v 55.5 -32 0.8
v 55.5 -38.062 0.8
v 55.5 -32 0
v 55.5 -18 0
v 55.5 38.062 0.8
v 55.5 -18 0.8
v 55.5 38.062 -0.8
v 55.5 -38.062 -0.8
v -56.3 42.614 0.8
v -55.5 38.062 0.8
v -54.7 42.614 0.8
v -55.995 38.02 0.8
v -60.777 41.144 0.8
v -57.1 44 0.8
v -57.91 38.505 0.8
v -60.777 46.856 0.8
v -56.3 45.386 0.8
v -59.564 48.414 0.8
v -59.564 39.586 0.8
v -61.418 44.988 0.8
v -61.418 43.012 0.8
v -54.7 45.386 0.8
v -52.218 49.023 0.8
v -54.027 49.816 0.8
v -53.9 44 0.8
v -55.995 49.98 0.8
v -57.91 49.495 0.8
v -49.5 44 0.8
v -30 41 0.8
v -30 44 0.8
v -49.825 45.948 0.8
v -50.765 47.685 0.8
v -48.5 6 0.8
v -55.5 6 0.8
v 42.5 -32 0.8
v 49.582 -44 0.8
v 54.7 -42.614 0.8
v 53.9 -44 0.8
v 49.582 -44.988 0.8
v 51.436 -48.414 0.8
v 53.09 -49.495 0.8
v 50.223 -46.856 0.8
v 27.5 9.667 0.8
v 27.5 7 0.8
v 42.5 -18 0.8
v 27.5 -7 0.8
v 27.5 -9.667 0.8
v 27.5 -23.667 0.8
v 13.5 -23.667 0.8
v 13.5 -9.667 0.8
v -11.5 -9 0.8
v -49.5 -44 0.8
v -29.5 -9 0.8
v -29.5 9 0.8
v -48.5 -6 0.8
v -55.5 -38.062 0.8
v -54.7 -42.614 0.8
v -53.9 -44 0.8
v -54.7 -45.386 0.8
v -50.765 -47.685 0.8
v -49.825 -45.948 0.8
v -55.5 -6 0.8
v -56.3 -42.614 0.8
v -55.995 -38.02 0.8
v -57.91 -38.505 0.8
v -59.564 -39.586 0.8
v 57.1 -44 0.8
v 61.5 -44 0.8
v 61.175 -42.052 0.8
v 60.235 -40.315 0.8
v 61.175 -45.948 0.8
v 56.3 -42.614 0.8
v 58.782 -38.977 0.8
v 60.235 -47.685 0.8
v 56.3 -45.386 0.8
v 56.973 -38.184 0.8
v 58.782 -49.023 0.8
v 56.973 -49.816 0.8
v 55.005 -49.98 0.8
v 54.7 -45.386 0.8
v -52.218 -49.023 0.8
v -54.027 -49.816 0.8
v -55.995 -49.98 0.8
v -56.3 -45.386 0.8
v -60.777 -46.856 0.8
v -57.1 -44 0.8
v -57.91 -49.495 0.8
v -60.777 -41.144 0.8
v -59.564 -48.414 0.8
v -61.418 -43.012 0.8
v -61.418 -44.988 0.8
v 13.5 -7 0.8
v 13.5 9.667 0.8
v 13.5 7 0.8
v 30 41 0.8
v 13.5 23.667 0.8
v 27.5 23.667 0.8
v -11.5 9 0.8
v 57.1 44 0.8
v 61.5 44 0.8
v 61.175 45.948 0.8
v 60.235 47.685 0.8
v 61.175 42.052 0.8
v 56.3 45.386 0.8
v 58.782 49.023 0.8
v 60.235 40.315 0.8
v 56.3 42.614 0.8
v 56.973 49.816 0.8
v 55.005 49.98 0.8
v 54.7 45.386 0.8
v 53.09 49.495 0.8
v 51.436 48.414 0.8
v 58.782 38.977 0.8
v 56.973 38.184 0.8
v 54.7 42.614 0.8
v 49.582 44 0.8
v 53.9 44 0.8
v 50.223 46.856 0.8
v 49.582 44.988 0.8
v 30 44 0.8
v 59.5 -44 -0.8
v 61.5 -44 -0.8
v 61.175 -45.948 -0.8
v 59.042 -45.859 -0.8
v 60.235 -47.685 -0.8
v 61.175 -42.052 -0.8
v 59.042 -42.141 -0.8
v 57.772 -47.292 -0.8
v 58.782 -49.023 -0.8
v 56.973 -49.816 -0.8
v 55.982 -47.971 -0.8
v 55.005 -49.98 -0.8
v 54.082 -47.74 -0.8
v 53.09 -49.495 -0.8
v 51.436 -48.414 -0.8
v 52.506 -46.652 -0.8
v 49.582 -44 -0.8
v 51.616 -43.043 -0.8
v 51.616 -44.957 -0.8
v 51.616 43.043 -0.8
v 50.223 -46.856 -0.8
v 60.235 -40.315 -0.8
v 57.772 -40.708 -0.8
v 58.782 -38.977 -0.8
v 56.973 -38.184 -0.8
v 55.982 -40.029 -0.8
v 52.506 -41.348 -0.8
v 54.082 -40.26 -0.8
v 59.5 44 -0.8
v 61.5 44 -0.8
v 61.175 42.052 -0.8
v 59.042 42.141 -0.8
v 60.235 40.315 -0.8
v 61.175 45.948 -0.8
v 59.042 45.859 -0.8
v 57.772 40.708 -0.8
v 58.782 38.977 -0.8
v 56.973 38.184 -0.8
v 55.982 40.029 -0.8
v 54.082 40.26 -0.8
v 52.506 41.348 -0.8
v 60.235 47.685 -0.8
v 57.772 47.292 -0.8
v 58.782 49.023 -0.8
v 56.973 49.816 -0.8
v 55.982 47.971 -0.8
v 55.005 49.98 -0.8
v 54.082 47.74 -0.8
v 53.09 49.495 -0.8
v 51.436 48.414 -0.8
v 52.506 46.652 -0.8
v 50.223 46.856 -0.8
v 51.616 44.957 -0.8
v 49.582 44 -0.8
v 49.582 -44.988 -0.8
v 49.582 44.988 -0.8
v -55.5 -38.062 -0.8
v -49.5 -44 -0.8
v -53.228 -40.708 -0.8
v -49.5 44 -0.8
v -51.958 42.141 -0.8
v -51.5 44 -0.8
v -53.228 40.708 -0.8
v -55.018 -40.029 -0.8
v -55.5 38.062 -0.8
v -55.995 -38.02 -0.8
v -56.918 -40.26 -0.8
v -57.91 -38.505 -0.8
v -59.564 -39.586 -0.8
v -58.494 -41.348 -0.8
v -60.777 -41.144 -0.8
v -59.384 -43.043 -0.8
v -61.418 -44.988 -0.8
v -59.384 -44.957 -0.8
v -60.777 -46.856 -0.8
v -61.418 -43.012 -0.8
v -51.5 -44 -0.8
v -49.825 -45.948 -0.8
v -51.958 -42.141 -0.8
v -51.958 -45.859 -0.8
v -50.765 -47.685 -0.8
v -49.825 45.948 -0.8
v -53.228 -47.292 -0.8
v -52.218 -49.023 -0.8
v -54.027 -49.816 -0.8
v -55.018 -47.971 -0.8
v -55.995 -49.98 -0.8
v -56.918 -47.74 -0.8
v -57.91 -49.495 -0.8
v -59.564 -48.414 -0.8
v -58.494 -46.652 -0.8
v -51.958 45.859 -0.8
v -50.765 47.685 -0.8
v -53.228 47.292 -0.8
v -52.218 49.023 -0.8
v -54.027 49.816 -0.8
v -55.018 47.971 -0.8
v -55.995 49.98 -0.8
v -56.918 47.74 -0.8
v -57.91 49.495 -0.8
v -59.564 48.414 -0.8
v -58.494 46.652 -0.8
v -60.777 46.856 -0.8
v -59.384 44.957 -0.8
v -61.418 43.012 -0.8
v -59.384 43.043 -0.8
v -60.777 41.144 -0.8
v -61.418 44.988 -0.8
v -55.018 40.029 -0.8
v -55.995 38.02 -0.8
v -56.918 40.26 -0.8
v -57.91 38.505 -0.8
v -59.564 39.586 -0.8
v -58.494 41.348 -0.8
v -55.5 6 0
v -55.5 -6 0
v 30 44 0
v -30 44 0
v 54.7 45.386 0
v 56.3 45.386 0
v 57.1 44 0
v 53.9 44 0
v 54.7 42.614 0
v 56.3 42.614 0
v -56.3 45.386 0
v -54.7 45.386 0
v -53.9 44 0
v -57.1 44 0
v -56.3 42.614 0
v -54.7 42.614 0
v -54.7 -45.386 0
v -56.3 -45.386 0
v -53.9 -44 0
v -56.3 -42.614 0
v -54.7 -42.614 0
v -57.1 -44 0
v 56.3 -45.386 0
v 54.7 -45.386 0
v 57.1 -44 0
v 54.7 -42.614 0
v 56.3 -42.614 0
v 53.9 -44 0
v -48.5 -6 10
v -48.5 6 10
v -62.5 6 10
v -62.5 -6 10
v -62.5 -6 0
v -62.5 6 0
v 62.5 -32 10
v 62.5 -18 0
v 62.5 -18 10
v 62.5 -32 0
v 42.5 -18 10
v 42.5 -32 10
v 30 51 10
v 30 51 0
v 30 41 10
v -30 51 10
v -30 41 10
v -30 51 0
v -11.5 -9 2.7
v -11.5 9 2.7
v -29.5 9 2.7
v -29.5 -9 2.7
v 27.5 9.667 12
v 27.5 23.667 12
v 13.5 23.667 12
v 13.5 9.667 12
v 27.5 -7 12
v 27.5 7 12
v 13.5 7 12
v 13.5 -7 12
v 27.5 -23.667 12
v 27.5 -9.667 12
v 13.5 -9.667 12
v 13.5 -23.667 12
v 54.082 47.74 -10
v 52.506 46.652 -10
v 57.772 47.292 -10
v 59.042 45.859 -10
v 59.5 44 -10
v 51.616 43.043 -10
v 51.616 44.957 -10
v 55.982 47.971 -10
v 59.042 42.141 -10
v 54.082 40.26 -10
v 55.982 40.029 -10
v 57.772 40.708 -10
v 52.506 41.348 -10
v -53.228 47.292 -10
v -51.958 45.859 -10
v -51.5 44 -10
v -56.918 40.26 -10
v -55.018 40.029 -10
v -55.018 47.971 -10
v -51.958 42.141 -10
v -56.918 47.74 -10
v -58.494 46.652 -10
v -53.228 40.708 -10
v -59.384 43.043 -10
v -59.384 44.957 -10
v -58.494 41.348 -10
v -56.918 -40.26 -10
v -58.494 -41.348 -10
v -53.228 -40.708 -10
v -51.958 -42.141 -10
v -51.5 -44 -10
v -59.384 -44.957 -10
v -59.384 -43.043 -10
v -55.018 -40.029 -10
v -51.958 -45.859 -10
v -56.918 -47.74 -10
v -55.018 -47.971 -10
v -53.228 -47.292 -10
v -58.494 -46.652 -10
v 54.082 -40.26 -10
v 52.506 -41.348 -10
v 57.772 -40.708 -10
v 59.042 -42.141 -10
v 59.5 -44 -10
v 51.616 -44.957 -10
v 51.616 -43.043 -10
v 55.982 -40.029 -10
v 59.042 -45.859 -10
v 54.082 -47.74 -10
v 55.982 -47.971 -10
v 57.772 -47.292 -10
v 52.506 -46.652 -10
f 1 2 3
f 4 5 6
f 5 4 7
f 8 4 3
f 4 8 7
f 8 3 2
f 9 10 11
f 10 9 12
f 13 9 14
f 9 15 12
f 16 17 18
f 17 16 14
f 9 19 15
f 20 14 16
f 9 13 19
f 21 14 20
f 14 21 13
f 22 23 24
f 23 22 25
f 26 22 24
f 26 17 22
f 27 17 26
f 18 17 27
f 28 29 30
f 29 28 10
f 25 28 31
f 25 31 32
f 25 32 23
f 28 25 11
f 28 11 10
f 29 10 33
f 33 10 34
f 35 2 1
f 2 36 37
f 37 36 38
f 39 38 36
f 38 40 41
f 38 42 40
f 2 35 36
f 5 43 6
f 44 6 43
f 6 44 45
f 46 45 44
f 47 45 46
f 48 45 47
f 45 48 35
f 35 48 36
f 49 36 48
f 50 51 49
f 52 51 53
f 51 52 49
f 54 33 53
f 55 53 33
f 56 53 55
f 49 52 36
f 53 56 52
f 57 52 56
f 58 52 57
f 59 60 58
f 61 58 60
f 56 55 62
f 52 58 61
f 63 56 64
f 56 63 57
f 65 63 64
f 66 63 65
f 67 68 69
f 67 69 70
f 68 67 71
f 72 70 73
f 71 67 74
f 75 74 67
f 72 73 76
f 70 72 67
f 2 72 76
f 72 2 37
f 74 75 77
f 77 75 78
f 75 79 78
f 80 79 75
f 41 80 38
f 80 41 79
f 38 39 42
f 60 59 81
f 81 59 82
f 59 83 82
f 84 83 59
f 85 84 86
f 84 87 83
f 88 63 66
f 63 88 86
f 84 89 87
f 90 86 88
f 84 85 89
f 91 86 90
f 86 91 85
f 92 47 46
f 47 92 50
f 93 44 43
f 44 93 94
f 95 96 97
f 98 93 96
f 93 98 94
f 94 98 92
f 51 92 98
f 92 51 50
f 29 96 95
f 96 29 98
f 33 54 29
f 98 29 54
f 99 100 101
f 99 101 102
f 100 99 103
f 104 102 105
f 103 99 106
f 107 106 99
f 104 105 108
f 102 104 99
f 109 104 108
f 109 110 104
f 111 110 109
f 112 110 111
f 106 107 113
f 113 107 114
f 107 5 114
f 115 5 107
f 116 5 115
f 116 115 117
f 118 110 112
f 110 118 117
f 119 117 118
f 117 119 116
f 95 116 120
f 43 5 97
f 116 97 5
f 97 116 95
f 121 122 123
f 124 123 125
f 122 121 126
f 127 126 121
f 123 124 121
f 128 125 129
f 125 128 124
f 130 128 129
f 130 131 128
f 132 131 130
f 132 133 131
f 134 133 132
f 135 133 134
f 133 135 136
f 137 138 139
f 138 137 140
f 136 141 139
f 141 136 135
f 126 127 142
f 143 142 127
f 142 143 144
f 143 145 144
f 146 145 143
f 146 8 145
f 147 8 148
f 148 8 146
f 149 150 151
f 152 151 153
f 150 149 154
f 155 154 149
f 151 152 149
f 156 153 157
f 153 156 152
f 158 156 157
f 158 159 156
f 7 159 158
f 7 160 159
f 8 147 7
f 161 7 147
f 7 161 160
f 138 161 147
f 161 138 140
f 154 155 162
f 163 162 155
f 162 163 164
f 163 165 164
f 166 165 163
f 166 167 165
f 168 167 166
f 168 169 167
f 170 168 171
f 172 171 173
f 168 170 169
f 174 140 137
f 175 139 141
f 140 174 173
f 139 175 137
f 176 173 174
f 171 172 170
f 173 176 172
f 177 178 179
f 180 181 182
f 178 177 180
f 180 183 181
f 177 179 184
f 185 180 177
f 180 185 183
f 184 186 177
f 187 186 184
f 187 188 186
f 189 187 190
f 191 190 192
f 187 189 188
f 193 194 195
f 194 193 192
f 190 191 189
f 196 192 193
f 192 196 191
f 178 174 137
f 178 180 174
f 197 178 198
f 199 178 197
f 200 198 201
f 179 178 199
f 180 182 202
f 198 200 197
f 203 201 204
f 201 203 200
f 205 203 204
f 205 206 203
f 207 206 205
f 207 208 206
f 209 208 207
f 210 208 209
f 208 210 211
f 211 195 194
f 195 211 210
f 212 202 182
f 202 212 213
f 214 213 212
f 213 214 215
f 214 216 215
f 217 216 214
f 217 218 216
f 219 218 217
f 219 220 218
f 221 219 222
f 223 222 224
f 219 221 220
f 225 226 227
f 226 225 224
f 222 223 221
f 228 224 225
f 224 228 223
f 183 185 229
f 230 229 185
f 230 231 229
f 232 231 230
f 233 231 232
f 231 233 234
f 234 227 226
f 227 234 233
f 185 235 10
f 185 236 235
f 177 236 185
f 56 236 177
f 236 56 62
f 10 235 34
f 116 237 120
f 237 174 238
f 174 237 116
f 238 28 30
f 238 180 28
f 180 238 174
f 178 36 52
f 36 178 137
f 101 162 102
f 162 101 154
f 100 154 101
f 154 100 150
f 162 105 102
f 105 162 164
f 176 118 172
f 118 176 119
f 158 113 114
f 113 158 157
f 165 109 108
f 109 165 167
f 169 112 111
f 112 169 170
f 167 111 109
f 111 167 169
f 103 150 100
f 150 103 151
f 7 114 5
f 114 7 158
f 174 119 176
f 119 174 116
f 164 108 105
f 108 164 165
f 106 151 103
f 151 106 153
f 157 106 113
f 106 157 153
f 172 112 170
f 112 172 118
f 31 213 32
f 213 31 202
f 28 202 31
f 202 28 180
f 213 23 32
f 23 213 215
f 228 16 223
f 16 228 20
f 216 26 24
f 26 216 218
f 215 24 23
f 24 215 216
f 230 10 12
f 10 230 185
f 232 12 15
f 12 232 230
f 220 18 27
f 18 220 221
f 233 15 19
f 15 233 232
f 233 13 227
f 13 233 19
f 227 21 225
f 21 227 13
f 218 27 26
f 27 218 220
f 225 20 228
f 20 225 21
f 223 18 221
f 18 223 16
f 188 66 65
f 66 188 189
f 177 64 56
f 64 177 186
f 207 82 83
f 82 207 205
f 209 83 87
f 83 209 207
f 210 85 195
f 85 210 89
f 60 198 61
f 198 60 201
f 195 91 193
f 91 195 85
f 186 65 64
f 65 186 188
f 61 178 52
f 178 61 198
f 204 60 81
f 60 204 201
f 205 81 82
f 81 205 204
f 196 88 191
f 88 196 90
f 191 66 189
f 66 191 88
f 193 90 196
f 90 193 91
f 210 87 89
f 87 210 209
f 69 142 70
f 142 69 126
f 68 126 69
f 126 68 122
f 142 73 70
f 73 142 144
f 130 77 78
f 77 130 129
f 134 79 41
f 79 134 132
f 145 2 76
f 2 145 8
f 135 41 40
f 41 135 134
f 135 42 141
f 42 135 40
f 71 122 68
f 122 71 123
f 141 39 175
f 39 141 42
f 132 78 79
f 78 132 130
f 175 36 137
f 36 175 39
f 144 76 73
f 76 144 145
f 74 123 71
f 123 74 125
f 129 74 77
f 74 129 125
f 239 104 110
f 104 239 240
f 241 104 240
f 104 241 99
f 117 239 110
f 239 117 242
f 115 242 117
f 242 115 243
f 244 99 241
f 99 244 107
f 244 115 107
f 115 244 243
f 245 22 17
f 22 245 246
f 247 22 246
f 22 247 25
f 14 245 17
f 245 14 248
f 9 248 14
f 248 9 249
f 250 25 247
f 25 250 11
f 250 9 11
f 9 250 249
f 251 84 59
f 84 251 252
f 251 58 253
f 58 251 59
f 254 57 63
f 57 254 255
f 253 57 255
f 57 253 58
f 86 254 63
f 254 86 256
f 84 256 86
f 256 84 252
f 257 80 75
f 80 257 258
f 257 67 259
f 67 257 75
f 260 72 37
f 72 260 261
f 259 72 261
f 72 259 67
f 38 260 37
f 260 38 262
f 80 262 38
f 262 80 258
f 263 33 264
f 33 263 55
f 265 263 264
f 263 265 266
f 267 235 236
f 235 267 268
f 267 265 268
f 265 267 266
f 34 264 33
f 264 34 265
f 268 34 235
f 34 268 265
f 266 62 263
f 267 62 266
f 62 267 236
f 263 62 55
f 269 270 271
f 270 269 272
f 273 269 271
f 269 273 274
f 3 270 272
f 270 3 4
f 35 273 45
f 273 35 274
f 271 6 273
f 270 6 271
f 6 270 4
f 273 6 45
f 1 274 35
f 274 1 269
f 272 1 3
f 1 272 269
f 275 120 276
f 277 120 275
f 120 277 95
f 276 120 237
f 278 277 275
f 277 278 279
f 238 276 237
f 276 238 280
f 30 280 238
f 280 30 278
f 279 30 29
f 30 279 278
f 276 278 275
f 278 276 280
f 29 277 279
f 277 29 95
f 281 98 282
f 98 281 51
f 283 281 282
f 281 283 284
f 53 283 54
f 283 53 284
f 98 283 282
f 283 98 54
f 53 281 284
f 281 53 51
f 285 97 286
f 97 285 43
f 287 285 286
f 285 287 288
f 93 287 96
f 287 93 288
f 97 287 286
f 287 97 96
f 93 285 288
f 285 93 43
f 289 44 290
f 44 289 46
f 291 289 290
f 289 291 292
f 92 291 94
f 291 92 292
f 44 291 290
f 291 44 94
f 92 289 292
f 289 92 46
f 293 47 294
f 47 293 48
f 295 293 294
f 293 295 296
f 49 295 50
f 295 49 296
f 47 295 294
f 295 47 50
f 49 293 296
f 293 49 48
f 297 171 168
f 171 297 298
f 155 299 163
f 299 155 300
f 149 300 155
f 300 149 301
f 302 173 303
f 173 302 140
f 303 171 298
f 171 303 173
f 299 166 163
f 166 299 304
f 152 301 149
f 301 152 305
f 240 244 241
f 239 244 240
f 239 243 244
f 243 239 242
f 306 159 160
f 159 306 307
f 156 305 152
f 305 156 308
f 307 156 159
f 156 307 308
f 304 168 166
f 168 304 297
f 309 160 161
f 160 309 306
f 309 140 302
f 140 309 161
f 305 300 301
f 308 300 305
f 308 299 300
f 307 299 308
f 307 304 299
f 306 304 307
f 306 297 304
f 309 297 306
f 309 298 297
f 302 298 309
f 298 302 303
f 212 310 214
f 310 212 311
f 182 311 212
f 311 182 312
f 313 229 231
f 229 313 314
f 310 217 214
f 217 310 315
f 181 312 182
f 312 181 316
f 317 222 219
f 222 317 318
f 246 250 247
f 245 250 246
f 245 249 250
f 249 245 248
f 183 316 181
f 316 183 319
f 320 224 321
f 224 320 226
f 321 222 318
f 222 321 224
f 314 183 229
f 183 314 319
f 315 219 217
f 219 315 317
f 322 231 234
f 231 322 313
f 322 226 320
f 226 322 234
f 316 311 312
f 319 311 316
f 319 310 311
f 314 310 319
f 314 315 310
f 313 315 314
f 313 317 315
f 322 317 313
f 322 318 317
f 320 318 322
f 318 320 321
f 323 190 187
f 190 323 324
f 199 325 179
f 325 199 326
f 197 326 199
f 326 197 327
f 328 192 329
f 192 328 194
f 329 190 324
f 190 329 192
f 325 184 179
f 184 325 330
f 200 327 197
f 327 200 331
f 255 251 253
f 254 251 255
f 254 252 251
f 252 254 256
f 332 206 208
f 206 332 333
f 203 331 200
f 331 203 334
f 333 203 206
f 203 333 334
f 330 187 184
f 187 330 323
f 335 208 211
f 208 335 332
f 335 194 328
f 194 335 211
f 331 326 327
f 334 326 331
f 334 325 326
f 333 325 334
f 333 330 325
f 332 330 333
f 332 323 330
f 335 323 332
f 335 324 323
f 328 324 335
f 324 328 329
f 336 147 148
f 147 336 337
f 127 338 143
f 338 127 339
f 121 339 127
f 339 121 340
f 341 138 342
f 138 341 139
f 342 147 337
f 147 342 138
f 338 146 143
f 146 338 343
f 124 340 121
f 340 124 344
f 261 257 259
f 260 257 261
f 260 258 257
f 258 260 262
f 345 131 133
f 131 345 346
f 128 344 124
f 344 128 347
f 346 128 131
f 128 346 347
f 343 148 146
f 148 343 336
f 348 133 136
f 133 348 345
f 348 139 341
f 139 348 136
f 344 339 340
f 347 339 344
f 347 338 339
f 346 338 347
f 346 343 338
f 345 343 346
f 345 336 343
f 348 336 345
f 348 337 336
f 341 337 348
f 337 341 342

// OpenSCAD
// Parameters
pcb_L = 123; //[61.5:246:0.5]
pcb_W = 100; //[50:200:0.5]
pcb_T = 1.6; //[0.8:3.2:0.1]
corner_R = 6; //[2:12:0.5]
hole_d = 3.2; //[2.4:5:0.1]
hole_edge_offset = 6; //[3:12:0.5]
standoff_d = 8; //[5:16:0.5]
standoff_h = 10; //[4:25:0.5]
standoff_overlap = 0.8; //[0.5:2:0.1]
conn_h = 10; //[6:20:0.5]
conn_overlap = 0.8; //[0.5:2:0.1]
chip_h = 2.5; //[1:6:0.1]
chip_overlap = 0.6; //[0.5:2:0.1]
heatsink_h = 12; //[6:30:0.5]
heatsink_overlap = 0.8; //[0.5:2:0.1]
silk_T = 0.2; //[0.1:0.6:0.05]
silk_overlap = 0.2; //[0.1:1:0.05]

// Base Shapes
module pcb_core_box() {
  cube([pcb_L - 2*corner_R, pcb_W - 2*corner_R, pcb_T], center=true);
}

module corner_cyl(pos) {
  translate(pos)
    cylinder(r=corner_R, h=pcb_T, center=true);
}

module mount_hole(pos) {
  translate(pos)
    cylinder(r=hole_d/2, h=pcb_T + 2, center=true);
}

module standoff(pos) {
  translate(pos)
    cylinder(r=standoff_d/2, h=standoff_h, center=true);
}

module connector(size, pos) {
  translate(pos)
    cube(size, center=true);
}

module chip(size, pos) {
  translate(pos)
    cube(size, center=true);
}

module heatsink(size, pos) {
  translate(pos)
    cube(size, center=true);
}

module silk_patch(size, pos) {
  translate(pos)
    cube(size, center=true);
}

// Operations
module corner_rounding() {
  union() {
    pcb_core_box();
    corner_cyl([pcb_L/2 - corner_R, pcb_W/2 - corner_R, 0]);
    corner_cyl([-pcb_L/2 + corner_R, pcb_W/2 - corner_R, 0]);
    corner_cyl([-pcb_L/2 + corner_R, -pcb_W/2 + corner_R, 0]);
    corner_cyl([pcb_L/2 - corner_R, -pcb_W/2 + corner_R, 0]);
  }
}

module pcb_board() {
  difference() {
    corner_rounding();
    mount_hole([pcb_L/2 - hole_edge_offset, pcb_W/2 - hole_edge_offset, 0]);
    mount_hole([-pcb_L/2 + hole_edge_offset, pcb_W/2 - hole_edge_offset, 0]);
    mount_hole([-pcb_L/2 + hole_edge_offset, -pcb_W/2 + hole_edge_offset, 0]);
    mount_hole([pcb_L/2 - hole_edge_offset, -pcb_W/2 + hole_edge_offset, 0]);
  }
}

module connectors() {
  union() {
    connector([14, 12, conn_h], [-pcb_L/2 + 14/2 - 1, 0, pcb_T/2 + conn_h/2 - conn_overlap]);
    connector([20, 14, conn_h], [pcb_L/2 - 20/2 + 1, -pcb_W/4, pcb_T/2 + conn_h/2 - conn_overlap]);
    connector([60, 10, conn_h], [0, pcb_W/2 - 10/2 + 1, pcb_T/2 + conn_h/2 - conn_overlap]);
  }
}

module chips() {
  union() {
    chip([18, 18, chip_h], [-pcb_L/6, 0, pcb_T/2 + chip_h/2 - chip_overlap]);
    chip([10, 10, chip_h], [pcb_L/6, pcb_W/6, pcb_T/2 + chip_h/2 - chip_overlap]);
    chip([10, 10, chip_h], [pcb_L/6, 0, pcb_T/2 + chip_h/2 - chip_overlap]);
    chip([10, 10, chip_h], [pcb_L/6, -pcb_W/6, pcb_T/2 + chip_h/2 - chip_overlap]);
  }
}

module heatsinks() {
  union() {
    heatsink([14, 14, heatsink_h], [pcb_L/6, pcb_W/6, pcb_T/2 + heatsink_h/2 - heatsink_overlap]);
    heatsink([14, 14, heatsink_h], [pcb_L/6, 0, pcb_T/2 + heatsink_h/2 - heatsink_overlap]);
    heatsink([14, 14, heatsink_h], [pcb_L/6, -pcb_W/6, pcb_T/2 + heatsink_h/2 - heatsink_overlap]);
  }
}

module silkscreen_text() {
  union() {
    silk_patch([pcb_L/3, pcb_W/6, silk_T], [-pcb_L/6, -pcb_W/4, pcb_T/2 + silk_T/2 - silk_overlap]);
    silk_patch([pcb_L/4, pcb_W/10, silk_T], [pcb_L/6, pcb_W/4, pcb_T/2 + silk_T/2 - silk_overlap]);
  }
}

module standoffs() {
  union() {
    standoff([pcb_L/2 - hole_edge_offset, pcb_W/2 - hole_edge_offset, -pcb_T/2 - standoff_h/2 + standoff_overlap]);
    standoff([-pcb_L/2 + hole_edge_offset, pcb_W/2 - hole_edge_offset, -pcb_T/2 - standoff_h/2 + standoff_overlap]);
    standoff([-pcb_L/2 + hole_edge_offset, -pcb_W/2 + hole_edge_offset, -pcb_T/2 - standoff_h/2 + standoff_overlap]);
    standoff([pcb_L/2 - hole_edge_offset, -pcb_W/2 + hole_edge_offset, -pcb_T/2 - standoff_h/2 + standoff_overlap]);
  }
}

// Final Model
module complete_model() {
  union() {
    pcb_board();
    connectors();
    chips();
    heatsinks();
    silkscreen_text();
    standoffs();
  }
}

// Render the complete model
color([0.0, 0.4, 0.2]) complete_model(); // PCB in green
